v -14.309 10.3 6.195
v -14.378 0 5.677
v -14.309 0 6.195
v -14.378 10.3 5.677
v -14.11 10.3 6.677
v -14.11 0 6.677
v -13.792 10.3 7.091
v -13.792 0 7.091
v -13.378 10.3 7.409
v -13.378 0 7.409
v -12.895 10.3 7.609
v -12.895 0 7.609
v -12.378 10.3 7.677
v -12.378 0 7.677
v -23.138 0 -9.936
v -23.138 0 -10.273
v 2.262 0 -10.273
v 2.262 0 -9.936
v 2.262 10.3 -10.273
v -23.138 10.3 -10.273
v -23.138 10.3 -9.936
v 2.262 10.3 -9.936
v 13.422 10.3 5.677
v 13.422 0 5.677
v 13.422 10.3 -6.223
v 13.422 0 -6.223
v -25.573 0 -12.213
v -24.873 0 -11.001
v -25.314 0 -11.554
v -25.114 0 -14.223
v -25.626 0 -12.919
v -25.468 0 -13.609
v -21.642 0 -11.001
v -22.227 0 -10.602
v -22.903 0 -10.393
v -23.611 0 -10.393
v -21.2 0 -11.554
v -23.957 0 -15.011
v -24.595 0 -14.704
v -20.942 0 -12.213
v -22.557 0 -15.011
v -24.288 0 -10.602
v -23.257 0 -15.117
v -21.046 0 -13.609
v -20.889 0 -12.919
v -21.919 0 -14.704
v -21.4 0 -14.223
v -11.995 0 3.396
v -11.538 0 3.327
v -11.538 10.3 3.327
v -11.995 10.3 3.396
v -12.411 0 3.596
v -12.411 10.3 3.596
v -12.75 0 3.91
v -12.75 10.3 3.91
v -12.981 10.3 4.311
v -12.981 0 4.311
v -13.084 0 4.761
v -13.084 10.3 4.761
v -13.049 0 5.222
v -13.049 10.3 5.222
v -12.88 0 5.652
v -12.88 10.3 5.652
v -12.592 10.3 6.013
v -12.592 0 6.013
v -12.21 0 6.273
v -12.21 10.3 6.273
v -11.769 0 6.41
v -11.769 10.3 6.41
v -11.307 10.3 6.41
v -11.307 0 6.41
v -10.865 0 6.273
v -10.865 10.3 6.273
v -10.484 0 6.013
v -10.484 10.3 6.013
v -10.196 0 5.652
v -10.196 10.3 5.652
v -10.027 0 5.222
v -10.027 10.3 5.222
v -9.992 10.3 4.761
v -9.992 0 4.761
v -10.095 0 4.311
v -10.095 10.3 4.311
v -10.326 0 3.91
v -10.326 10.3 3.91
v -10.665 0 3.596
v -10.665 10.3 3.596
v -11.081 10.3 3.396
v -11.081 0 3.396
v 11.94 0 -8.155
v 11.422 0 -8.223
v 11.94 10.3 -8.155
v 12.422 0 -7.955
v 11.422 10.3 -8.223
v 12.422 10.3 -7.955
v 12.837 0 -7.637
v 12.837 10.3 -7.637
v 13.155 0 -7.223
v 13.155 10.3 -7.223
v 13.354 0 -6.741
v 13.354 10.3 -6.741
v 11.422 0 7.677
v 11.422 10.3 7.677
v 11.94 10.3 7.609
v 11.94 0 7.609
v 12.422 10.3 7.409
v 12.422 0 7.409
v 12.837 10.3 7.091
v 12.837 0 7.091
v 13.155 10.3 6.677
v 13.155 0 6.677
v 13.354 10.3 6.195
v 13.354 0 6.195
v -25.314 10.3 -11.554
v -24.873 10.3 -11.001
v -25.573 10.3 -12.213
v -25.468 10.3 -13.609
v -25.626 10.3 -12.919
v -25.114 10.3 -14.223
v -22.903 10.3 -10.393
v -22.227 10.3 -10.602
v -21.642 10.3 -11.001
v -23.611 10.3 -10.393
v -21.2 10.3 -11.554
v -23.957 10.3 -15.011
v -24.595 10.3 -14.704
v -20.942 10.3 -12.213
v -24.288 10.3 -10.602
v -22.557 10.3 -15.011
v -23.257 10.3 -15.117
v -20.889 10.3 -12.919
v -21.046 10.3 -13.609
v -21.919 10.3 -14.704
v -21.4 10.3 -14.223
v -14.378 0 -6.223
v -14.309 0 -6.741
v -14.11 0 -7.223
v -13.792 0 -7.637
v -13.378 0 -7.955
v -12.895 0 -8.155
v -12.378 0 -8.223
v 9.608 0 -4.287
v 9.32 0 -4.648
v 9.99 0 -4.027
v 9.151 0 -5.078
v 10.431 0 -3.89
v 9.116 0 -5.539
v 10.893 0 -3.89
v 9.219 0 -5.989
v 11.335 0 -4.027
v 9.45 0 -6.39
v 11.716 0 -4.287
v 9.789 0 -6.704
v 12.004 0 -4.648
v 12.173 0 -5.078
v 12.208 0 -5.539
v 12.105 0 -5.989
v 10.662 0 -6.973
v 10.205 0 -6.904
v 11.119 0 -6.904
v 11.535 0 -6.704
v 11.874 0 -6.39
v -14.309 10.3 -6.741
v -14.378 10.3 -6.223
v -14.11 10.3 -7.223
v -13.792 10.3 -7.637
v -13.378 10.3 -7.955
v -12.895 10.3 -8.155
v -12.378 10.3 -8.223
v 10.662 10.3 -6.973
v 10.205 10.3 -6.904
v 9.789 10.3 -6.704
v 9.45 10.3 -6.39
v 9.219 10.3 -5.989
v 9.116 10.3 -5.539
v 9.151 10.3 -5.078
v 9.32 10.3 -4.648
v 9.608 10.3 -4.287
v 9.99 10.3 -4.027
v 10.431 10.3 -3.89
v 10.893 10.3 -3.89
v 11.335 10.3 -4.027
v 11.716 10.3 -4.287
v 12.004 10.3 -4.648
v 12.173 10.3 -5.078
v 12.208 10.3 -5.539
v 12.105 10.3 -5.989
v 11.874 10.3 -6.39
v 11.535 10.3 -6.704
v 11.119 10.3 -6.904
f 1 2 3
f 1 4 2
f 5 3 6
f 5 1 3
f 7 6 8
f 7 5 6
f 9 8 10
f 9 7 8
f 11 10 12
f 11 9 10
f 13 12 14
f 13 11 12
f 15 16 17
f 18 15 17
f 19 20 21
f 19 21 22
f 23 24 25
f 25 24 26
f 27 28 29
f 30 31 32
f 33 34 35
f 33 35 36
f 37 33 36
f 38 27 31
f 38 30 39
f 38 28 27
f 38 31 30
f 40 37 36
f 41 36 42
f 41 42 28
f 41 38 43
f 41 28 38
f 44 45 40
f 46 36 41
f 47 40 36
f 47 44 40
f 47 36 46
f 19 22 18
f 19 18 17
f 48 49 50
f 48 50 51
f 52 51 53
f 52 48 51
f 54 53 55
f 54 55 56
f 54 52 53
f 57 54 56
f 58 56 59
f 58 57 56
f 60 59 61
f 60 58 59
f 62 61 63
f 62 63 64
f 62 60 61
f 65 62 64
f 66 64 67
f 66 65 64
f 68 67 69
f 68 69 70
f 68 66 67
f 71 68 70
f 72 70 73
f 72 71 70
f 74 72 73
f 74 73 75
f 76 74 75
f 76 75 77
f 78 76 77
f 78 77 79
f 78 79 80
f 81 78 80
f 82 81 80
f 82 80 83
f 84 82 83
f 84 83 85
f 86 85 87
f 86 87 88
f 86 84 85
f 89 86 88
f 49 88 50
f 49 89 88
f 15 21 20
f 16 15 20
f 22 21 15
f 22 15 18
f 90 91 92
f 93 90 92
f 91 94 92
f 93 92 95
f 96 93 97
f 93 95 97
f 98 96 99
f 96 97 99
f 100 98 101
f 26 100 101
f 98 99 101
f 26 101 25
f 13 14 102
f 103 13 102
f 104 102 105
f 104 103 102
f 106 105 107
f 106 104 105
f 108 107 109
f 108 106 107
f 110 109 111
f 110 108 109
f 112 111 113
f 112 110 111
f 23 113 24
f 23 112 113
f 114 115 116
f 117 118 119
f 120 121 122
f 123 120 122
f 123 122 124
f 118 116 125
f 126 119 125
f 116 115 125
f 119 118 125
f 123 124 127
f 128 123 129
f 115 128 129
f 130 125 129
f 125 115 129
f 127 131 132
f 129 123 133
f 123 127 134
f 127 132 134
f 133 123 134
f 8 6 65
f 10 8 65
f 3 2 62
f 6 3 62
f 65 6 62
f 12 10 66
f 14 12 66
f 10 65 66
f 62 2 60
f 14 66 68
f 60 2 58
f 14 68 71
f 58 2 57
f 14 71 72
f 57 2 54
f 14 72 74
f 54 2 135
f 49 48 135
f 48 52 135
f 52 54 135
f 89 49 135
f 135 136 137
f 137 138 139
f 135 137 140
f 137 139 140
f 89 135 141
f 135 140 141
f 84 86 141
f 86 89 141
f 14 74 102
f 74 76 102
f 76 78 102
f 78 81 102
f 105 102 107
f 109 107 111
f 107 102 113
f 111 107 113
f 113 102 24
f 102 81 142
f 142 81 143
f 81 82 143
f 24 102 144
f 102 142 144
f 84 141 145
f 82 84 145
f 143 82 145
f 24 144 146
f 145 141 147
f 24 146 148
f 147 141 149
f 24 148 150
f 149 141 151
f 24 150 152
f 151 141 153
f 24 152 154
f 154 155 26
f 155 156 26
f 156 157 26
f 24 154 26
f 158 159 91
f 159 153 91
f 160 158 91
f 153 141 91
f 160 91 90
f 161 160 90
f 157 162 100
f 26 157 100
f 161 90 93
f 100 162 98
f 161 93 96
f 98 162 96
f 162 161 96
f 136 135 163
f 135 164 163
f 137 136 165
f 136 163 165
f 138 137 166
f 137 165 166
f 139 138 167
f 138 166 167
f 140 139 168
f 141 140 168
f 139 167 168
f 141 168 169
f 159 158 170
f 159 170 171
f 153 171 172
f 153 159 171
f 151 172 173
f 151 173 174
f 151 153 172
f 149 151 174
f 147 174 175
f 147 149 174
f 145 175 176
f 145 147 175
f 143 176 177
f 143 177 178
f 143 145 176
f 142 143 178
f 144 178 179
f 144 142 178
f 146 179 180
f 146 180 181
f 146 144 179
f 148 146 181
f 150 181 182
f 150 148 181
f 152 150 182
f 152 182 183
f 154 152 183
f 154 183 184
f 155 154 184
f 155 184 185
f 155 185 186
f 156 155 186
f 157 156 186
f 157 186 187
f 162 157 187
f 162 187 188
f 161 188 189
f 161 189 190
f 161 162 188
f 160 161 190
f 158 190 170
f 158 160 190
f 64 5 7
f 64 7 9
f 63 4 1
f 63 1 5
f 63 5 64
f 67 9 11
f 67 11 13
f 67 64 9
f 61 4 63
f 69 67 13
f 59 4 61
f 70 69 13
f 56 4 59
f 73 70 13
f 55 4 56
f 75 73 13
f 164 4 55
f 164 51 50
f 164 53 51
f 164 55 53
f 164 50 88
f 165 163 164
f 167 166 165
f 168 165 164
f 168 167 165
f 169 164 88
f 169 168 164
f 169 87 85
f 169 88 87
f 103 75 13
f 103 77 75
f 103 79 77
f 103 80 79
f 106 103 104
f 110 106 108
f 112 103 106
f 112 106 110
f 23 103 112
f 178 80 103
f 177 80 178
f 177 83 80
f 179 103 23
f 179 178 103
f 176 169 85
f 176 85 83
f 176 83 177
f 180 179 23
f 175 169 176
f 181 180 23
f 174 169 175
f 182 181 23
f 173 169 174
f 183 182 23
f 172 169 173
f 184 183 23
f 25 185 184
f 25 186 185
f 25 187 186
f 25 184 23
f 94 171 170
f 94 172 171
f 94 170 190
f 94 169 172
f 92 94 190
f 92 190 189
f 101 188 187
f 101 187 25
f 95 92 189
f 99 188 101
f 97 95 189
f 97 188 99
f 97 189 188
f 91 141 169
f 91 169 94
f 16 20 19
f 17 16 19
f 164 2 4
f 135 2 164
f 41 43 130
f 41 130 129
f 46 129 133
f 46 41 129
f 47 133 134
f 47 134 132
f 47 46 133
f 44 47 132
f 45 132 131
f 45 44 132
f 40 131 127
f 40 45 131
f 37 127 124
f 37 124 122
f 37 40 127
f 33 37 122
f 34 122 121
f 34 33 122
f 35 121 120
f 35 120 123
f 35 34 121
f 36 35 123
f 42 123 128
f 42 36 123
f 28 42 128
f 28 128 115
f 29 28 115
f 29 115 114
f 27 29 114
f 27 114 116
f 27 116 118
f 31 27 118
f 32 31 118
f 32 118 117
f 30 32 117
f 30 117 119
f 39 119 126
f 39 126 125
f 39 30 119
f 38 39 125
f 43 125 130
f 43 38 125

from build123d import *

# Parameters (mm, degrees)
SKETCH1_W           = 27.8
SKETCH1_H           = 15.9
SKETCH1_R           = 1.55
BOSS_EXTRUDE1_DEPTH = 10.3
FILLET1_R           = 2
SKETCH2_W           = 25.4
SKETCH2_H           = 0.337095458
BOSS_EXTRUDE2_DEPTH = 10.3
SKETCH3_R           = 2.375
BOSS_EXTRUDE3_DEPTH = 10.3


with BuildPart() as part:
    # Sketch1 → Boss-Extrude1 (new body)
    with BuildSketch(Plane(origin=(0, 0, 0), x_dir=(1, 0, 0), z_dir=(0, 1, 0))):
        with Locations((-0.477504057, 0.273104838)):
            Rectangle(SKETCH1_W, SKETCH1_H)
        with Locations(Location((10.662060344, 5.423104838, 0), (0, 0, 90))):
            Circle(SKETCH1_R, mode=Mode.SUBTRACT)
        with Locations(Location((-11.537939656, -4.876895162, 0), (0, 0, 90))):
            Circle(SKETCH1_R, mode=Mode.SUBTRACT)
    extrude(amount=BOSS_EXTRUDE1_DEPTH)

    # Fillet1
    fillet1_edges = [part.edges().sort_by_distance(p)[0] for p in [
        (-14.377504057, 5.15, -8.223104838),
        (13.422495943, 5.15, -8.223104838),
        (13.422495943, 5.15, 7.676895162),
        (-14.377504057, 5.15, 7.676895162),
    ]]
    fillet(fillet1_edges, radius=FILLET1_R)


with BuildPart() as body_2:
    # Sketch2 → Boss-Extrude2 (new body)
    with BuildSketch(Plane(origin=(0, 10.3, 0), x_dir=(1, 0, 0), z_dir=(0, 1, 0))):
        with Locations((-10.437939656, 10.104131828)):
            Rectangle(SKETCH2_W, SKETCH2_H)
    extrude(amount=-BOSS_EXTRUDE2_DEPTH)


with BuildPart() as body_3:
    # Sketch3 → Boss-Extrude3 (new body)
    with BuildSketch(Plane(origin=(-46.217462662, 0, 0), x_dir=(-1, 0, 0), z_dir=(0, -1, 0))):
        with Locations(Location((-22.960225011, 12.74171273, 0), (0, 0, 90))):
            Circle(SKETCH3_R)
    extrude(amount=-BOSS_EXTRUDE3_DEPTH)


solid = Compound([part.part, body_2.part, body_3.part])
